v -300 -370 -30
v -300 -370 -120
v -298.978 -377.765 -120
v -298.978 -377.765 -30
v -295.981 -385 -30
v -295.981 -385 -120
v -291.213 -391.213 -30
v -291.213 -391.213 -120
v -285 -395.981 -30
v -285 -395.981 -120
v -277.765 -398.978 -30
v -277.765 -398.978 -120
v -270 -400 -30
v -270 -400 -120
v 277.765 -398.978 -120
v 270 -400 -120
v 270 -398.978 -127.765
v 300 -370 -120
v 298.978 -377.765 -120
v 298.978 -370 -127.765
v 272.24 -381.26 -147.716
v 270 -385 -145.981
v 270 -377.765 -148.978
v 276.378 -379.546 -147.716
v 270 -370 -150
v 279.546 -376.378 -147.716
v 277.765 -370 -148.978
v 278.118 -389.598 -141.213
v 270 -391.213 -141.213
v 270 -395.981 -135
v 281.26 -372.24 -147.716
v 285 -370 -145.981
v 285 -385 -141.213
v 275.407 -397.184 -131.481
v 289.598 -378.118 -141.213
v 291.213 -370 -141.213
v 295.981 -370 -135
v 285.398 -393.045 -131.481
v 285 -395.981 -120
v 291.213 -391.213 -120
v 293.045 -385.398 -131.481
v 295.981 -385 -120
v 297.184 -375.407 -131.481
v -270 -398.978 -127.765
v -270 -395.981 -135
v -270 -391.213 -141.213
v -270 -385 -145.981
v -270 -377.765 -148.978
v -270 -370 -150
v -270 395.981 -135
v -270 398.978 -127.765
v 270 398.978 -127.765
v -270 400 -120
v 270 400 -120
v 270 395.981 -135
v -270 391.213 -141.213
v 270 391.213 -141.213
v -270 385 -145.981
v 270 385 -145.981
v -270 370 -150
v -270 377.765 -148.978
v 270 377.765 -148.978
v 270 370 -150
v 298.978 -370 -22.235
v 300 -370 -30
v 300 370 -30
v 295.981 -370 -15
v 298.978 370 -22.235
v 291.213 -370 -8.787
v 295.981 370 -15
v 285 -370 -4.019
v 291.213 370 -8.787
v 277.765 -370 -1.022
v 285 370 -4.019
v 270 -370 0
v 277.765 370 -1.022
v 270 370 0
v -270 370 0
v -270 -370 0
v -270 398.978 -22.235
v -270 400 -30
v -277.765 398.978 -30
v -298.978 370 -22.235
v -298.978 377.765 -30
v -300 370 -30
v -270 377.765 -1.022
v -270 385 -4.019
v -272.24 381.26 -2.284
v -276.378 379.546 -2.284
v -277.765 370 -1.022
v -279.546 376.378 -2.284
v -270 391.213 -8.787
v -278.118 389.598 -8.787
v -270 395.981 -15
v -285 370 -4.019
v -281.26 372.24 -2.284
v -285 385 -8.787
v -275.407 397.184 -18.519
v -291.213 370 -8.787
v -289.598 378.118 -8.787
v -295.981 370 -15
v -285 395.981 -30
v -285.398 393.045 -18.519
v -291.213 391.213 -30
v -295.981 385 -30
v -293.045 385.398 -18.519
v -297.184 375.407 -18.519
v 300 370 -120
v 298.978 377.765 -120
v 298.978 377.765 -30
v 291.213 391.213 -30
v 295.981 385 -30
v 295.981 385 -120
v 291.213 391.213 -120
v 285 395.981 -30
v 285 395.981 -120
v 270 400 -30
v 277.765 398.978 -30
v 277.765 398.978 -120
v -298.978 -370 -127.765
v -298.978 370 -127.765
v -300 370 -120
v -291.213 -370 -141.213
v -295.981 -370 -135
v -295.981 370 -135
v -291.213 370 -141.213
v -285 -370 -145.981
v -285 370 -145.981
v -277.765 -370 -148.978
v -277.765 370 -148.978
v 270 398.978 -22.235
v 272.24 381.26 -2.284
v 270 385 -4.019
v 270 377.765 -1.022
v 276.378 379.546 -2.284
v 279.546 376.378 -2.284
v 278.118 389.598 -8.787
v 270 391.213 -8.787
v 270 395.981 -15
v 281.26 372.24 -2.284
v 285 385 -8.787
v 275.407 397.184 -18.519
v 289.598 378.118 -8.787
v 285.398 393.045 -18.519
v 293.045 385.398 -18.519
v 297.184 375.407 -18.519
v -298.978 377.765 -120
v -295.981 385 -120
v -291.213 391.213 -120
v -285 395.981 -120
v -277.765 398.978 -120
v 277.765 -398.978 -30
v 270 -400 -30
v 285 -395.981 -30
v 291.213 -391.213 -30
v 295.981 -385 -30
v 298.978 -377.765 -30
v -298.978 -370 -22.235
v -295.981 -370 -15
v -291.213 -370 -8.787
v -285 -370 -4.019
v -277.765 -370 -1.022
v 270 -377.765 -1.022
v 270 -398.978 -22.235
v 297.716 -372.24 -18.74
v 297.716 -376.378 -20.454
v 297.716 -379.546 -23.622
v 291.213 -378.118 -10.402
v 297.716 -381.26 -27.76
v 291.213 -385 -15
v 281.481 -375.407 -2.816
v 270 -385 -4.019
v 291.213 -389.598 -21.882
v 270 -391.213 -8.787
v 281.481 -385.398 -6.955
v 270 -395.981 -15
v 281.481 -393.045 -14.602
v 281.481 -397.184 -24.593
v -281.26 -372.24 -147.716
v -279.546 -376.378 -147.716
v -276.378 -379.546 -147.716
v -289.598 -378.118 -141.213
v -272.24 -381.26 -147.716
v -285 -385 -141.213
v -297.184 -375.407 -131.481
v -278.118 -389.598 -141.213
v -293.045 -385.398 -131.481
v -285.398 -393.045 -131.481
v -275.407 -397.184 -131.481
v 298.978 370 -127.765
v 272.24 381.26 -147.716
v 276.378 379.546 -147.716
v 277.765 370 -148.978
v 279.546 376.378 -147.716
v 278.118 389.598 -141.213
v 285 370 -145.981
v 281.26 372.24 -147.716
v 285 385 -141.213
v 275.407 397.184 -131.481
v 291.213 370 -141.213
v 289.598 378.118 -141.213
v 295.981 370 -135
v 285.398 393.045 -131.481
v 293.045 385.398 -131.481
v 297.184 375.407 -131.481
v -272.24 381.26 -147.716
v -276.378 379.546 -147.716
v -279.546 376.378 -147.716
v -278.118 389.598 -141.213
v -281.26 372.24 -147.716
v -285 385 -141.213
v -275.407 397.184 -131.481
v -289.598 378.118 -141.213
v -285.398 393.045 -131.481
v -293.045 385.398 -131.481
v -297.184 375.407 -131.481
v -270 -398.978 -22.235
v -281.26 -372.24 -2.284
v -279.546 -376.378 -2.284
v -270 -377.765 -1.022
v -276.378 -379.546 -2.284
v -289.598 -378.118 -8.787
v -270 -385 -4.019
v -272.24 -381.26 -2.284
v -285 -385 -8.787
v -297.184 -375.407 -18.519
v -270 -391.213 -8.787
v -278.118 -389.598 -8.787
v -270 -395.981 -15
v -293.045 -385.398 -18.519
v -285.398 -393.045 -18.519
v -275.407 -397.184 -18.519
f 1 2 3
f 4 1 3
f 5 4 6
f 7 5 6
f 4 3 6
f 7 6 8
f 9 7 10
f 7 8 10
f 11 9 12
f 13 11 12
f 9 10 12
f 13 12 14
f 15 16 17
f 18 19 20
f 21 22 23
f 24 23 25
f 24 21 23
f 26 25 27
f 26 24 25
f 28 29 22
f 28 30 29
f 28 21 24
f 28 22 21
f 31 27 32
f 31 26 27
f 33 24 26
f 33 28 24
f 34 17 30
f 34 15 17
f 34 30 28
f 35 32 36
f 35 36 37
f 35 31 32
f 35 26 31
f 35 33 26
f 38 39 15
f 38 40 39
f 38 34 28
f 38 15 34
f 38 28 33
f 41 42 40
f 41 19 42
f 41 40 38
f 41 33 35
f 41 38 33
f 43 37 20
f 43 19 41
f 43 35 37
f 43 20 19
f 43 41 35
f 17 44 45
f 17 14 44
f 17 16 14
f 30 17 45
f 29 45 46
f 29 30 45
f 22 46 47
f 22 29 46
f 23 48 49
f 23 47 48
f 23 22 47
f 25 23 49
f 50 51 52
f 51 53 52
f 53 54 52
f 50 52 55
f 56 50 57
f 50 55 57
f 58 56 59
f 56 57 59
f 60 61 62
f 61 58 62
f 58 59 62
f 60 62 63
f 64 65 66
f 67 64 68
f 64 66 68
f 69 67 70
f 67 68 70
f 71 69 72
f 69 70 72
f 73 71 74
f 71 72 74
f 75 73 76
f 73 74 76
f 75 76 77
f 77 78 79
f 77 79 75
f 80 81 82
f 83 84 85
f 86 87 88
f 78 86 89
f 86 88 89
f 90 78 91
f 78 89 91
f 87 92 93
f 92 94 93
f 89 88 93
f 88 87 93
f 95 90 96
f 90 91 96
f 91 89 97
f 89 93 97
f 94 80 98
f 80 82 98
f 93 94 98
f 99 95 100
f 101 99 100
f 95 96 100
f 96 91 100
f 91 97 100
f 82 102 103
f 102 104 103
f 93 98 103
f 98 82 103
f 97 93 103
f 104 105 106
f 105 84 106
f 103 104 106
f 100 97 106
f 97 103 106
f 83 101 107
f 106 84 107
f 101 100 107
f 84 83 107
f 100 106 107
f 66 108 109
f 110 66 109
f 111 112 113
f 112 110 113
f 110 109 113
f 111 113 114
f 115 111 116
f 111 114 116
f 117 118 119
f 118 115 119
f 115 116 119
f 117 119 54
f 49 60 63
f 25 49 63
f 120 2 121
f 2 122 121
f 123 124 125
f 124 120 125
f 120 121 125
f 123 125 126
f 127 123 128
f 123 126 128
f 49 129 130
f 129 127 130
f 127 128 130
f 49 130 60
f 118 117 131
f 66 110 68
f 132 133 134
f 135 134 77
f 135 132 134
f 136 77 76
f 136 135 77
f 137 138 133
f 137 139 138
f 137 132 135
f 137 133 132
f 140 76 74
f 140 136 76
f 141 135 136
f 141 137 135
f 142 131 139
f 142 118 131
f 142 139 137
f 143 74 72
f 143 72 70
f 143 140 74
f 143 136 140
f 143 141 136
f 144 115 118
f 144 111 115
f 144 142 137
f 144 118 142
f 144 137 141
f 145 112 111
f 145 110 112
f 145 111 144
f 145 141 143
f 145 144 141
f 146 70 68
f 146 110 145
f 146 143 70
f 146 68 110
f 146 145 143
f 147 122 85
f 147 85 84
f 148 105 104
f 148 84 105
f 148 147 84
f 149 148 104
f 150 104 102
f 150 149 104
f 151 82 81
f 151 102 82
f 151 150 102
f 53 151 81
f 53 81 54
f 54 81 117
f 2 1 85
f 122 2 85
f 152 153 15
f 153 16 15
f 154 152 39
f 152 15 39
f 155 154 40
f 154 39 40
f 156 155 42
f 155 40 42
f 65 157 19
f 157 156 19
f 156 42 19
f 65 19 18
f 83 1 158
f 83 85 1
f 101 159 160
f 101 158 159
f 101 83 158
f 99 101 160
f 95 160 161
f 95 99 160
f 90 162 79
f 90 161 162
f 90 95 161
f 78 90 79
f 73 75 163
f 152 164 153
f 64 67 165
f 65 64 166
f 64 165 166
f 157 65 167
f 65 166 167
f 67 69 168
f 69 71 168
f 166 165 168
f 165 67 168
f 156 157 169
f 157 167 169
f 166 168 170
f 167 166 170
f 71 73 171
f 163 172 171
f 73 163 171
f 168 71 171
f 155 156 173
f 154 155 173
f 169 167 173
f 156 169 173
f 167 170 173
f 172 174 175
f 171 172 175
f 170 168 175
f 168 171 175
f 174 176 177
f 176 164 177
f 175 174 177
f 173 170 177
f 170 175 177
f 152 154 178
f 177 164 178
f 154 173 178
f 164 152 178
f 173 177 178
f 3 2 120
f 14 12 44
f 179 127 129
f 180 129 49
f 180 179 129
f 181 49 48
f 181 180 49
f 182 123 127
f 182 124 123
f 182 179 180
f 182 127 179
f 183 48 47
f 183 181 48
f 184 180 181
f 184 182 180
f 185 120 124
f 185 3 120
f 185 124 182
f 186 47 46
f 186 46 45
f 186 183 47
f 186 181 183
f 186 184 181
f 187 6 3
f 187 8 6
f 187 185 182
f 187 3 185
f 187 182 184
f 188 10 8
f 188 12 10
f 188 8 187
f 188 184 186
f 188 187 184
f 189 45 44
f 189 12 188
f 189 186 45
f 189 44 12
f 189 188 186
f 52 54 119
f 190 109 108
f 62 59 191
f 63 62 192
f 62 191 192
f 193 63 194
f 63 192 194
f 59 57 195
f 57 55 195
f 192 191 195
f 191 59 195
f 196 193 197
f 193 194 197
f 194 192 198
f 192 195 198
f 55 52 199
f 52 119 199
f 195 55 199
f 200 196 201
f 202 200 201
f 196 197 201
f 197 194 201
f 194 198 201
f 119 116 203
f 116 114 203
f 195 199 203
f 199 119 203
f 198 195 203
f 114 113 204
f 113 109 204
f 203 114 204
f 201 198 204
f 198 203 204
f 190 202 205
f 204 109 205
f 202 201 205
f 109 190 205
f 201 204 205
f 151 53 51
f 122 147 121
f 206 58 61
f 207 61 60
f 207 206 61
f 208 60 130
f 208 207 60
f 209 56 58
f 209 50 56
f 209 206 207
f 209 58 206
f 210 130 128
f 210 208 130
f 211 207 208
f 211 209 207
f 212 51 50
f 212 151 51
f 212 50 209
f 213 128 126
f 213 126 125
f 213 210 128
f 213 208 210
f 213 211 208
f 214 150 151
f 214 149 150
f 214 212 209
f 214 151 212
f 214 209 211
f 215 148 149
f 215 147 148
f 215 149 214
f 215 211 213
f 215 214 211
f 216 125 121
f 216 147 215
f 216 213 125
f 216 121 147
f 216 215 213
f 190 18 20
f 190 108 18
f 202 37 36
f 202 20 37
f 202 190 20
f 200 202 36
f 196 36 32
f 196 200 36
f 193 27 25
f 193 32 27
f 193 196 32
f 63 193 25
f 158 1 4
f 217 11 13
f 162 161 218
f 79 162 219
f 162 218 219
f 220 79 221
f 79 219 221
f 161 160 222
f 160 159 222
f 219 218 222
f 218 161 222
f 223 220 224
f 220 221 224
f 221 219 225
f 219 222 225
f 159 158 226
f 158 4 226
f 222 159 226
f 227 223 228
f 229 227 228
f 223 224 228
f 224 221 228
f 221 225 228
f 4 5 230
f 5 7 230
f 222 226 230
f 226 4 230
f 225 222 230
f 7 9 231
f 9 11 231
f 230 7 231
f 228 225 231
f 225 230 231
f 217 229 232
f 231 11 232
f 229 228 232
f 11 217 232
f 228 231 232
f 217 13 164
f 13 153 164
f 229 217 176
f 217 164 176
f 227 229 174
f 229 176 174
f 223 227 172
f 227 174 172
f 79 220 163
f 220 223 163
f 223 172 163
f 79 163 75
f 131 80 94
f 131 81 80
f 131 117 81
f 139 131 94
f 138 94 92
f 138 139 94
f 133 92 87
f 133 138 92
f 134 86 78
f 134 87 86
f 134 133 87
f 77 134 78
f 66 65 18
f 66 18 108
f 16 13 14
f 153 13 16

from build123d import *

# Parameters (mm, degrees)
F0_W     = 600
F0_H     = 800
F1_DEPTH = 150
F2_R     = 30


with BuildPart() as f1:
    # F0 (on Top) → F1 (new body)
    with BuildSketch(Plane.XY):
        Rectangle(F0_W, F0_H)
    extrude(amount=-F1_DEPTH)

    # F2
    f2_edges = [f1.edges().sort_by_distance(p)[0] for p in [
        (300, 400, -75),
        (-300, 400, -75),
        (0, 400, 0),
        (0, 400, -150),
        (-300, -400, -75),
        (-300, 0, 0),
        (-300, 0, -150),
        (0, -400, 0),
        (300, 0, 0),
        (300, -400, -75),
        (0, -400, -150),
        (300, 0, -150),
    ]]
    fillet(f2_edges, radius=F2_R)


solid = f1.part
